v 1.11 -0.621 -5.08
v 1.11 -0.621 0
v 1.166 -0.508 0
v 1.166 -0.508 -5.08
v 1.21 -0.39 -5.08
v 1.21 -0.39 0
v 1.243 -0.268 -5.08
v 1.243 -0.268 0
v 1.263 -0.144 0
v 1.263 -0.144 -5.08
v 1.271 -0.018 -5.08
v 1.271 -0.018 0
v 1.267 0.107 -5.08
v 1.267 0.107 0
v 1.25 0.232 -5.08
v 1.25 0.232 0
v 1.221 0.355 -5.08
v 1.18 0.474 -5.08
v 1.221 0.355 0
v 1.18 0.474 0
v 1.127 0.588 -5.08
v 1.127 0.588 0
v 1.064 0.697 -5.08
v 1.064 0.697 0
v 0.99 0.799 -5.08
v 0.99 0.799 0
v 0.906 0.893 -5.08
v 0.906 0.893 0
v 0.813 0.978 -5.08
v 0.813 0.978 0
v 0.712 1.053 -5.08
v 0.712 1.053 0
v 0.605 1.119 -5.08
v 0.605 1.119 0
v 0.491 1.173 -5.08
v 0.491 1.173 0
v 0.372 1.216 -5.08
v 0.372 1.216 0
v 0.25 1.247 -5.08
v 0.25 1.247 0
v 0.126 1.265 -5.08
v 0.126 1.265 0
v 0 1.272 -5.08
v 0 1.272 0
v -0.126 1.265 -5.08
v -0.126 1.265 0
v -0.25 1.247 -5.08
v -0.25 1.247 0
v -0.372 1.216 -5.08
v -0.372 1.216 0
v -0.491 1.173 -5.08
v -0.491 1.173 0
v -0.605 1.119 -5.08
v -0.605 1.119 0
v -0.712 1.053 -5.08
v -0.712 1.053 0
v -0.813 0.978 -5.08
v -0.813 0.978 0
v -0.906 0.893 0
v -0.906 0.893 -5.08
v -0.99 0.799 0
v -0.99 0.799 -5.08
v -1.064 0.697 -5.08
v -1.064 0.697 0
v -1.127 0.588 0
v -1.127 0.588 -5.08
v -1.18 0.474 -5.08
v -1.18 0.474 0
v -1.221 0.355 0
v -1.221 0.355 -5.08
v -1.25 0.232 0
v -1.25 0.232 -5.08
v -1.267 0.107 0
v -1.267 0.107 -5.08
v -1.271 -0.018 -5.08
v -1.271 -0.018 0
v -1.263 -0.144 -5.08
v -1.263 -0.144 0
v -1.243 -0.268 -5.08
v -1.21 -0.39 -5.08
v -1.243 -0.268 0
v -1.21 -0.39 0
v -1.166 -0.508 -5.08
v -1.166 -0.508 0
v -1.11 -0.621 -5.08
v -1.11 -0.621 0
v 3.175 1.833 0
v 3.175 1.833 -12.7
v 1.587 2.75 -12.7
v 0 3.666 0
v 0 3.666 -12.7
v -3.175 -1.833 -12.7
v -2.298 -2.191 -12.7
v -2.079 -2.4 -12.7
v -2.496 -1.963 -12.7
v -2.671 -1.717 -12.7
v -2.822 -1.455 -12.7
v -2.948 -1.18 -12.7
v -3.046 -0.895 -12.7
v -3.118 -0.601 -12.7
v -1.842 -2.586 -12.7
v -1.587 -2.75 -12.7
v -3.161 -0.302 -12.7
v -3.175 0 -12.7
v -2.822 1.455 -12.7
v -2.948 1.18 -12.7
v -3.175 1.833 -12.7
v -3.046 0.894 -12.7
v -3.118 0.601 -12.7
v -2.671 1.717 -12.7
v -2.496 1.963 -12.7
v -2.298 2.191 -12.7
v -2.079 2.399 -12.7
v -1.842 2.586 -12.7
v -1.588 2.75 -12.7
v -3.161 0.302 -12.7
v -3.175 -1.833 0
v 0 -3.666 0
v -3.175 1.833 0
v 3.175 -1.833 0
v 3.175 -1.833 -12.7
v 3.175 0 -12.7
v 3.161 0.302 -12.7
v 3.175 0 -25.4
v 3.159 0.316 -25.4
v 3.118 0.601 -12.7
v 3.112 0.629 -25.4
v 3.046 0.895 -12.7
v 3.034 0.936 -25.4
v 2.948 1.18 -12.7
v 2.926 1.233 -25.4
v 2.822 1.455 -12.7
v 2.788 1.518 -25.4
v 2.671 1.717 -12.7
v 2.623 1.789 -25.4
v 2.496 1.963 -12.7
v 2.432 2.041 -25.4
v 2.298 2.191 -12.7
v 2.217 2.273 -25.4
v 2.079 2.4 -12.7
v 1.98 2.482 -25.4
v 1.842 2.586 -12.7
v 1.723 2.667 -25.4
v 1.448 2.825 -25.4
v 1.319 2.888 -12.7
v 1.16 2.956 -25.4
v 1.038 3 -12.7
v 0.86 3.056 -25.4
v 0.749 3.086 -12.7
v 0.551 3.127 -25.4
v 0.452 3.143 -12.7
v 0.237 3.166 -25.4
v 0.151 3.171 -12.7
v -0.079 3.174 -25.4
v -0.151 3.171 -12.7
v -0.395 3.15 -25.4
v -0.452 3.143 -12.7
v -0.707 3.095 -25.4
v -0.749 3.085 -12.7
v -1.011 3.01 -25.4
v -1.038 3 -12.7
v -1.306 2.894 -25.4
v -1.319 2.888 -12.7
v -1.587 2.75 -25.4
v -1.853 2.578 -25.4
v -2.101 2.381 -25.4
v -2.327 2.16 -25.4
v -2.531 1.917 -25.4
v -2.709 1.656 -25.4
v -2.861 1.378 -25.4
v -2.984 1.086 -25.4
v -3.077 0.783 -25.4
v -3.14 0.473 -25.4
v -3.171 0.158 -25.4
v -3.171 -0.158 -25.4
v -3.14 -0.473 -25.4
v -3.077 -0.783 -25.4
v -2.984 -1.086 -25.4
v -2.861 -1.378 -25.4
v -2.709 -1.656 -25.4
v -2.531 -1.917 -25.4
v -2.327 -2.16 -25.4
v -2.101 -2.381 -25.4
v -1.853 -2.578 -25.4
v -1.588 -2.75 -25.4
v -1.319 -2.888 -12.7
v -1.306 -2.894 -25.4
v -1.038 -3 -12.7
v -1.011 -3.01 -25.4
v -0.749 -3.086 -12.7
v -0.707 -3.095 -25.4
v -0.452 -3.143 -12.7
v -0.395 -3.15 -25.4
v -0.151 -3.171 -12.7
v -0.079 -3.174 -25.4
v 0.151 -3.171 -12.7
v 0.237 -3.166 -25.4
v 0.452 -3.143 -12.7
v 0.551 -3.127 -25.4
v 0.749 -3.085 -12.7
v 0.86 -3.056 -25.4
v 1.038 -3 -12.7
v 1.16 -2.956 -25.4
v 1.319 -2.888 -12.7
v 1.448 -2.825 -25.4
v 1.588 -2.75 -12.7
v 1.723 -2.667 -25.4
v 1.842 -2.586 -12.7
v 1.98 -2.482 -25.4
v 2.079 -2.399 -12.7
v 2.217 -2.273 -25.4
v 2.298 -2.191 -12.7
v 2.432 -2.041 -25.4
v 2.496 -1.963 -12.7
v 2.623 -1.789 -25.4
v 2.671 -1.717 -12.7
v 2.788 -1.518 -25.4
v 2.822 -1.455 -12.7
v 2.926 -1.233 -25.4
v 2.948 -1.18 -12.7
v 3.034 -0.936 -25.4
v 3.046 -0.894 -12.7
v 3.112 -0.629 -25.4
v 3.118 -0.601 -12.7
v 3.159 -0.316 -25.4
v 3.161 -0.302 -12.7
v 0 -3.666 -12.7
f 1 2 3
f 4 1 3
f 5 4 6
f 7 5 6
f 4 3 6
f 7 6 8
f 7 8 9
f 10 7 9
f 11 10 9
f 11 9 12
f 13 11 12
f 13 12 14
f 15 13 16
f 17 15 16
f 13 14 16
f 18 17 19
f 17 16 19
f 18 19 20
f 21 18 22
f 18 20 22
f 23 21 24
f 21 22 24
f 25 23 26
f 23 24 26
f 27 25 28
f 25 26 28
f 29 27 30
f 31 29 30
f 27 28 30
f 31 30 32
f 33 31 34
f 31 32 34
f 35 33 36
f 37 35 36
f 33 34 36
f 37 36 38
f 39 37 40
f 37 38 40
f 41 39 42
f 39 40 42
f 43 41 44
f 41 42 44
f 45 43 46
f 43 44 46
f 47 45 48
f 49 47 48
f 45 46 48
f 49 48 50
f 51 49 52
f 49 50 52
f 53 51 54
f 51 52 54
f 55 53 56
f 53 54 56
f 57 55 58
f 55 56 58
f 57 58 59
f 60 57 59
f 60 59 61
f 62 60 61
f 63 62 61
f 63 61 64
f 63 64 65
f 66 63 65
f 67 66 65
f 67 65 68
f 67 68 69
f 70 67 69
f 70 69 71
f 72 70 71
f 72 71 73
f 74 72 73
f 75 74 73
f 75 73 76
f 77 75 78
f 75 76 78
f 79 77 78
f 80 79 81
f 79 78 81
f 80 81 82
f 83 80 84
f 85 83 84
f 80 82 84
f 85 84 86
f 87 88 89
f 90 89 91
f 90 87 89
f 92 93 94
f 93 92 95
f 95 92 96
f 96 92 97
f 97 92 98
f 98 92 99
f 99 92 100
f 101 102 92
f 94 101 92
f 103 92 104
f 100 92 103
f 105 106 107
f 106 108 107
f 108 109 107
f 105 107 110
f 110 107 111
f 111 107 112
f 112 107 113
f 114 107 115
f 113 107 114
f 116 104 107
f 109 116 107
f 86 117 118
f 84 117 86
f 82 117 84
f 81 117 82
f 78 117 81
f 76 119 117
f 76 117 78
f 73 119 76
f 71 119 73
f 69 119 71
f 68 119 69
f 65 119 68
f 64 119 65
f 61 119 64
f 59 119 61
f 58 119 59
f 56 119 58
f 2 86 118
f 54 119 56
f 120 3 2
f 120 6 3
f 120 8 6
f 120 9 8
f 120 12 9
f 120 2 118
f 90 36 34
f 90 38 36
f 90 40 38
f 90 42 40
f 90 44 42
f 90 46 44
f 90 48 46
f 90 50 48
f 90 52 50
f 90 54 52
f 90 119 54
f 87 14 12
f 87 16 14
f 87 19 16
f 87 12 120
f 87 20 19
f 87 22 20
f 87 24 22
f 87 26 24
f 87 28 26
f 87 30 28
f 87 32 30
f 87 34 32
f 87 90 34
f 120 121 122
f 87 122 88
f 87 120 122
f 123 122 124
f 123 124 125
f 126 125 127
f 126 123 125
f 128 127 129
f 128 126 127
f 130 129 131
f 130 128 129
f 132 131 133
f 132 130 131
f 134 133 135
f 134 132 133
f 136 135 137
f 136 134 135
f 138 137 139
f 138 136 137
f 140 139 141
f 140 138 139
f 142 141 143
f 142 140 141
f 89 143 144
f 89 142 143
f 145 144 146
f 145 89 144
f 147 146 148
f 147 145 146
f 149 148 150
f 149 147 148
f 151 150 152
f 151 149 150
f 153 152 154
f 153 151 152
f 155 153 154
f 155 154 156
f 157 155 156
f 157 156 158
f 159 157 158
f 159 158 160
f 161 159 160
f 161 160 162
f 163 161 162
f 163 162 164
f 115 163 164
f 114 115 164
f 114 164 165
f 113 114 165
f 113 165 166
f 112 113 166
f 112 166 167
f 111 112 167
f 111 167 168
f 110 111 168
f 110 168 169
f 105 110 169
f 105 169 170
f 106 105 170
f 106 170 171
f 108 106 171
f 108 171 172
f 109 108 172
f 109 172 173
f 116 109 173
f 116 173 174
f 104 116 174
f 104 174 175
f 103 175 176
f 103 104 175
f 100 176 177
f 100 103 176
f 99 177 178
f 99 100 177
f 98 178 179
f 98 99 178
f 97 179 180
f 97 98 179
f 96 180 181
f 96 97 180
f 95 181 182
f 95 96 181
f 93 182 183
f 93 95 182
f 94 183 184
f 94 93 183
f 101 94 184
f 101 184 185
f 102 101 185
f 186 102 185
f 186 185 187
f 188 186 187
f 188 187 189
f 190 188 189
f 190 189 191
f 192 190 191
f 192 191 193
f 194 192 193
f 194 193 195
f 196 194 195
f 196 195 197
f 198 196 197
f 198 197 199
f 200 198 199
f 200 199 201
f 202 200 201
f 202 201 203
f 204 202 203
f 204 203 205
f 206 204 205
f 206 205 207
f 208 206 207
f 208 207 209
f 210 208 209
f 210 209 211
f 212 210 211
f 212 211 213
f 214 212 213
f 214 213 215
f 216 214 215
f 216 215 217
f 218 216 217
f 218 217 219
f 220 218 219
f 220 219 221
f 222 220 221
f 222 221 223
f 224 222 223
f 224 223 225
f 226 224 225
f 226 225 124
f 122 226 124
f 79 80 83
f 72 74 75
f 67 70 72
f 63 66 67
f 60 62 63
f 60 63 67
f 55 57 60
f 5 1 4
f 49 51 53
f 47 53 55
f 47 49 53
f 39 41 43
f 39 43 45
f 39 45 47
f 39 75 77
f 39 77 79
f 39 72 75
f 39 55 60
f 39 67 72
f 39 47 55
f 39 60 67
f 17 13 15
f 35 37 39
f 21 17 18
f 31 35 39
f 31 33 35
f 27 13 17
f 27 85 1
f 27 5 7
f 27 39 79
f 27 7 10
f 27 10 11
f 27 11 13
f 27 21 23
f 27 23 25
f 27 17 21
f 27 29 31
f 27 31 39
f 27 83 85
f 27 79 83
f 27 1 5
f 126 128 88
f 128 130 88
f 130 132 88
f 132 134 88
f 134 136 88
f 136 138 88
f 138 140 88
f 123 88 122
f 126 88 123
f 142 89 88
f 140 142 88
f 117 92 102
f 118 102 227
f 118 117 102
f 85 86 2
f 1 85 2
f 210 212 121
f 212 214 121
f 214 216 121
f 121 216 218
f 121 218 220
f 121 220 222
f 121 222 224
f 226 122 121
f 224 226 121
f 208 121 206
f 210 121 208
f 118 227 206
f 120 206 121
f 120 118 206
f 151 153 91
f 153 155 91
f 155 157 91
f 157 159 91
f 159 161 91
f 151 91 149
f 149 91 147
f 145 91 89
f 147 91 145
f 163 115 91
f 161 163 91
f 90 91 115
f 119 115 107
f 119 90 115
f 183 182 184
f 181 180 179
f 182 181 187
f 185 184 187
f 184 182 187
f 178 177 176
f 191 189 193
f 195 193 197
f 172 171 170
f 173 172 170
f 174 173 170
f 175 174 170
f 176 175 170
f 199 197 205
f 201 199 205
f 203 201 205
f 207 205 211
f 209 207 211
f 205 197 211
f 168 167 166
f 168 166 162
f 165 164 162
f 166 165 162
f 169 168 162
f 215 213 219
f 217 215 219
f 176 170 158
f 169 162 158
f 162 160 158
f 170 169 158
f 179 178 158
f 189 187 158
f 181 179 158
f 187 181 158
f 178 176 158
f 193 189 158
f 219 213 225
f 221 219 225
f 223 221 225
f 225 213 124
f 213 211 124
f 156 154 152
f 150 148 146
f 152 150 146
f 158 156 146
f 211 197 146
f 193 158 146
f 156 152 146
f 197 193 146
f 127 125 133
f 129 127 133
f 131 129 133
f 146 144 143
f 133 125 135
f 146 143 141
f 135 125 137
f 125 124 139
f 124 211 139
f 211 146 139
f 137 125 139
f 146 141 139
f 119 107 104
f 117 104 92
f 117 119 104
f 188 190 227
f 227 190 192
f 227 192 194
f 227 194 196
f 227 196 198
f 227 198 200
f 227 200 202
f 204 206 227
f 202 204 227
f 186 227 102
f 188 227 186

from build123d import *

# Parameters (mm, degrees)
BOSS_EXTRUDE1_DEPTH = 25.4
CUT_EXTRUDE1_DEPTH  = 5.08
SKETCH3_OUTSIDE_W   = 13.788
SKETCH3_OUTSIDE_H   = 14.77
SKETCH3_OUTSIDE_R   = 3.175
CUT_EXTRUDE2_DEPTH  = 13.7


with BuildPart() as part:
    # Sketch1 → Boss-Extrude1 (new body)
    with BuildSketch(Plane.XY):
        Polygon((0, 3.666174209), (-3.175, 1.833087105), (-3.175, -1.833087105), (0, -3.666174209), (3.175, -1.833087105), (3.175, 1.833087105), align=None)
    extrude(amount=-BOSS_EXTRUDE1_DEPTH)

    # Sketch2 → Cut-Extrude1 (cut)
    with BuildSketch(Plane.XY):
        with BuildLine():
            Line((-1.109862584, -0.6206744), (1.109862584, -0.6206744))
            ThreePointArc((1.109862584, -0.6206744), (0, 1.2716256), (-1.109862584, -0.6206744))
        make_face()
    extrude(amount=-CUT_EXTRUDE1_DEPTH, mode=Mode.SUBTRACT)

    # Sketch3 outside → Cut-Extrude2 (cut, through all)
    with BuildSketch(Plane.XY.offset(-12.7)):
        Rectangle(SKETCH3_OUTSIDE_W, SKETCH3_OUTSIDE_H)
        Circle(SKETCH3_OUTSIDE_R, mode=Mode.SUBTRACT)
    extrude(amount=-CUT_EXTRUDE2_DEPTH, mode=Mode.SUBTRACT)


solid = part.part
